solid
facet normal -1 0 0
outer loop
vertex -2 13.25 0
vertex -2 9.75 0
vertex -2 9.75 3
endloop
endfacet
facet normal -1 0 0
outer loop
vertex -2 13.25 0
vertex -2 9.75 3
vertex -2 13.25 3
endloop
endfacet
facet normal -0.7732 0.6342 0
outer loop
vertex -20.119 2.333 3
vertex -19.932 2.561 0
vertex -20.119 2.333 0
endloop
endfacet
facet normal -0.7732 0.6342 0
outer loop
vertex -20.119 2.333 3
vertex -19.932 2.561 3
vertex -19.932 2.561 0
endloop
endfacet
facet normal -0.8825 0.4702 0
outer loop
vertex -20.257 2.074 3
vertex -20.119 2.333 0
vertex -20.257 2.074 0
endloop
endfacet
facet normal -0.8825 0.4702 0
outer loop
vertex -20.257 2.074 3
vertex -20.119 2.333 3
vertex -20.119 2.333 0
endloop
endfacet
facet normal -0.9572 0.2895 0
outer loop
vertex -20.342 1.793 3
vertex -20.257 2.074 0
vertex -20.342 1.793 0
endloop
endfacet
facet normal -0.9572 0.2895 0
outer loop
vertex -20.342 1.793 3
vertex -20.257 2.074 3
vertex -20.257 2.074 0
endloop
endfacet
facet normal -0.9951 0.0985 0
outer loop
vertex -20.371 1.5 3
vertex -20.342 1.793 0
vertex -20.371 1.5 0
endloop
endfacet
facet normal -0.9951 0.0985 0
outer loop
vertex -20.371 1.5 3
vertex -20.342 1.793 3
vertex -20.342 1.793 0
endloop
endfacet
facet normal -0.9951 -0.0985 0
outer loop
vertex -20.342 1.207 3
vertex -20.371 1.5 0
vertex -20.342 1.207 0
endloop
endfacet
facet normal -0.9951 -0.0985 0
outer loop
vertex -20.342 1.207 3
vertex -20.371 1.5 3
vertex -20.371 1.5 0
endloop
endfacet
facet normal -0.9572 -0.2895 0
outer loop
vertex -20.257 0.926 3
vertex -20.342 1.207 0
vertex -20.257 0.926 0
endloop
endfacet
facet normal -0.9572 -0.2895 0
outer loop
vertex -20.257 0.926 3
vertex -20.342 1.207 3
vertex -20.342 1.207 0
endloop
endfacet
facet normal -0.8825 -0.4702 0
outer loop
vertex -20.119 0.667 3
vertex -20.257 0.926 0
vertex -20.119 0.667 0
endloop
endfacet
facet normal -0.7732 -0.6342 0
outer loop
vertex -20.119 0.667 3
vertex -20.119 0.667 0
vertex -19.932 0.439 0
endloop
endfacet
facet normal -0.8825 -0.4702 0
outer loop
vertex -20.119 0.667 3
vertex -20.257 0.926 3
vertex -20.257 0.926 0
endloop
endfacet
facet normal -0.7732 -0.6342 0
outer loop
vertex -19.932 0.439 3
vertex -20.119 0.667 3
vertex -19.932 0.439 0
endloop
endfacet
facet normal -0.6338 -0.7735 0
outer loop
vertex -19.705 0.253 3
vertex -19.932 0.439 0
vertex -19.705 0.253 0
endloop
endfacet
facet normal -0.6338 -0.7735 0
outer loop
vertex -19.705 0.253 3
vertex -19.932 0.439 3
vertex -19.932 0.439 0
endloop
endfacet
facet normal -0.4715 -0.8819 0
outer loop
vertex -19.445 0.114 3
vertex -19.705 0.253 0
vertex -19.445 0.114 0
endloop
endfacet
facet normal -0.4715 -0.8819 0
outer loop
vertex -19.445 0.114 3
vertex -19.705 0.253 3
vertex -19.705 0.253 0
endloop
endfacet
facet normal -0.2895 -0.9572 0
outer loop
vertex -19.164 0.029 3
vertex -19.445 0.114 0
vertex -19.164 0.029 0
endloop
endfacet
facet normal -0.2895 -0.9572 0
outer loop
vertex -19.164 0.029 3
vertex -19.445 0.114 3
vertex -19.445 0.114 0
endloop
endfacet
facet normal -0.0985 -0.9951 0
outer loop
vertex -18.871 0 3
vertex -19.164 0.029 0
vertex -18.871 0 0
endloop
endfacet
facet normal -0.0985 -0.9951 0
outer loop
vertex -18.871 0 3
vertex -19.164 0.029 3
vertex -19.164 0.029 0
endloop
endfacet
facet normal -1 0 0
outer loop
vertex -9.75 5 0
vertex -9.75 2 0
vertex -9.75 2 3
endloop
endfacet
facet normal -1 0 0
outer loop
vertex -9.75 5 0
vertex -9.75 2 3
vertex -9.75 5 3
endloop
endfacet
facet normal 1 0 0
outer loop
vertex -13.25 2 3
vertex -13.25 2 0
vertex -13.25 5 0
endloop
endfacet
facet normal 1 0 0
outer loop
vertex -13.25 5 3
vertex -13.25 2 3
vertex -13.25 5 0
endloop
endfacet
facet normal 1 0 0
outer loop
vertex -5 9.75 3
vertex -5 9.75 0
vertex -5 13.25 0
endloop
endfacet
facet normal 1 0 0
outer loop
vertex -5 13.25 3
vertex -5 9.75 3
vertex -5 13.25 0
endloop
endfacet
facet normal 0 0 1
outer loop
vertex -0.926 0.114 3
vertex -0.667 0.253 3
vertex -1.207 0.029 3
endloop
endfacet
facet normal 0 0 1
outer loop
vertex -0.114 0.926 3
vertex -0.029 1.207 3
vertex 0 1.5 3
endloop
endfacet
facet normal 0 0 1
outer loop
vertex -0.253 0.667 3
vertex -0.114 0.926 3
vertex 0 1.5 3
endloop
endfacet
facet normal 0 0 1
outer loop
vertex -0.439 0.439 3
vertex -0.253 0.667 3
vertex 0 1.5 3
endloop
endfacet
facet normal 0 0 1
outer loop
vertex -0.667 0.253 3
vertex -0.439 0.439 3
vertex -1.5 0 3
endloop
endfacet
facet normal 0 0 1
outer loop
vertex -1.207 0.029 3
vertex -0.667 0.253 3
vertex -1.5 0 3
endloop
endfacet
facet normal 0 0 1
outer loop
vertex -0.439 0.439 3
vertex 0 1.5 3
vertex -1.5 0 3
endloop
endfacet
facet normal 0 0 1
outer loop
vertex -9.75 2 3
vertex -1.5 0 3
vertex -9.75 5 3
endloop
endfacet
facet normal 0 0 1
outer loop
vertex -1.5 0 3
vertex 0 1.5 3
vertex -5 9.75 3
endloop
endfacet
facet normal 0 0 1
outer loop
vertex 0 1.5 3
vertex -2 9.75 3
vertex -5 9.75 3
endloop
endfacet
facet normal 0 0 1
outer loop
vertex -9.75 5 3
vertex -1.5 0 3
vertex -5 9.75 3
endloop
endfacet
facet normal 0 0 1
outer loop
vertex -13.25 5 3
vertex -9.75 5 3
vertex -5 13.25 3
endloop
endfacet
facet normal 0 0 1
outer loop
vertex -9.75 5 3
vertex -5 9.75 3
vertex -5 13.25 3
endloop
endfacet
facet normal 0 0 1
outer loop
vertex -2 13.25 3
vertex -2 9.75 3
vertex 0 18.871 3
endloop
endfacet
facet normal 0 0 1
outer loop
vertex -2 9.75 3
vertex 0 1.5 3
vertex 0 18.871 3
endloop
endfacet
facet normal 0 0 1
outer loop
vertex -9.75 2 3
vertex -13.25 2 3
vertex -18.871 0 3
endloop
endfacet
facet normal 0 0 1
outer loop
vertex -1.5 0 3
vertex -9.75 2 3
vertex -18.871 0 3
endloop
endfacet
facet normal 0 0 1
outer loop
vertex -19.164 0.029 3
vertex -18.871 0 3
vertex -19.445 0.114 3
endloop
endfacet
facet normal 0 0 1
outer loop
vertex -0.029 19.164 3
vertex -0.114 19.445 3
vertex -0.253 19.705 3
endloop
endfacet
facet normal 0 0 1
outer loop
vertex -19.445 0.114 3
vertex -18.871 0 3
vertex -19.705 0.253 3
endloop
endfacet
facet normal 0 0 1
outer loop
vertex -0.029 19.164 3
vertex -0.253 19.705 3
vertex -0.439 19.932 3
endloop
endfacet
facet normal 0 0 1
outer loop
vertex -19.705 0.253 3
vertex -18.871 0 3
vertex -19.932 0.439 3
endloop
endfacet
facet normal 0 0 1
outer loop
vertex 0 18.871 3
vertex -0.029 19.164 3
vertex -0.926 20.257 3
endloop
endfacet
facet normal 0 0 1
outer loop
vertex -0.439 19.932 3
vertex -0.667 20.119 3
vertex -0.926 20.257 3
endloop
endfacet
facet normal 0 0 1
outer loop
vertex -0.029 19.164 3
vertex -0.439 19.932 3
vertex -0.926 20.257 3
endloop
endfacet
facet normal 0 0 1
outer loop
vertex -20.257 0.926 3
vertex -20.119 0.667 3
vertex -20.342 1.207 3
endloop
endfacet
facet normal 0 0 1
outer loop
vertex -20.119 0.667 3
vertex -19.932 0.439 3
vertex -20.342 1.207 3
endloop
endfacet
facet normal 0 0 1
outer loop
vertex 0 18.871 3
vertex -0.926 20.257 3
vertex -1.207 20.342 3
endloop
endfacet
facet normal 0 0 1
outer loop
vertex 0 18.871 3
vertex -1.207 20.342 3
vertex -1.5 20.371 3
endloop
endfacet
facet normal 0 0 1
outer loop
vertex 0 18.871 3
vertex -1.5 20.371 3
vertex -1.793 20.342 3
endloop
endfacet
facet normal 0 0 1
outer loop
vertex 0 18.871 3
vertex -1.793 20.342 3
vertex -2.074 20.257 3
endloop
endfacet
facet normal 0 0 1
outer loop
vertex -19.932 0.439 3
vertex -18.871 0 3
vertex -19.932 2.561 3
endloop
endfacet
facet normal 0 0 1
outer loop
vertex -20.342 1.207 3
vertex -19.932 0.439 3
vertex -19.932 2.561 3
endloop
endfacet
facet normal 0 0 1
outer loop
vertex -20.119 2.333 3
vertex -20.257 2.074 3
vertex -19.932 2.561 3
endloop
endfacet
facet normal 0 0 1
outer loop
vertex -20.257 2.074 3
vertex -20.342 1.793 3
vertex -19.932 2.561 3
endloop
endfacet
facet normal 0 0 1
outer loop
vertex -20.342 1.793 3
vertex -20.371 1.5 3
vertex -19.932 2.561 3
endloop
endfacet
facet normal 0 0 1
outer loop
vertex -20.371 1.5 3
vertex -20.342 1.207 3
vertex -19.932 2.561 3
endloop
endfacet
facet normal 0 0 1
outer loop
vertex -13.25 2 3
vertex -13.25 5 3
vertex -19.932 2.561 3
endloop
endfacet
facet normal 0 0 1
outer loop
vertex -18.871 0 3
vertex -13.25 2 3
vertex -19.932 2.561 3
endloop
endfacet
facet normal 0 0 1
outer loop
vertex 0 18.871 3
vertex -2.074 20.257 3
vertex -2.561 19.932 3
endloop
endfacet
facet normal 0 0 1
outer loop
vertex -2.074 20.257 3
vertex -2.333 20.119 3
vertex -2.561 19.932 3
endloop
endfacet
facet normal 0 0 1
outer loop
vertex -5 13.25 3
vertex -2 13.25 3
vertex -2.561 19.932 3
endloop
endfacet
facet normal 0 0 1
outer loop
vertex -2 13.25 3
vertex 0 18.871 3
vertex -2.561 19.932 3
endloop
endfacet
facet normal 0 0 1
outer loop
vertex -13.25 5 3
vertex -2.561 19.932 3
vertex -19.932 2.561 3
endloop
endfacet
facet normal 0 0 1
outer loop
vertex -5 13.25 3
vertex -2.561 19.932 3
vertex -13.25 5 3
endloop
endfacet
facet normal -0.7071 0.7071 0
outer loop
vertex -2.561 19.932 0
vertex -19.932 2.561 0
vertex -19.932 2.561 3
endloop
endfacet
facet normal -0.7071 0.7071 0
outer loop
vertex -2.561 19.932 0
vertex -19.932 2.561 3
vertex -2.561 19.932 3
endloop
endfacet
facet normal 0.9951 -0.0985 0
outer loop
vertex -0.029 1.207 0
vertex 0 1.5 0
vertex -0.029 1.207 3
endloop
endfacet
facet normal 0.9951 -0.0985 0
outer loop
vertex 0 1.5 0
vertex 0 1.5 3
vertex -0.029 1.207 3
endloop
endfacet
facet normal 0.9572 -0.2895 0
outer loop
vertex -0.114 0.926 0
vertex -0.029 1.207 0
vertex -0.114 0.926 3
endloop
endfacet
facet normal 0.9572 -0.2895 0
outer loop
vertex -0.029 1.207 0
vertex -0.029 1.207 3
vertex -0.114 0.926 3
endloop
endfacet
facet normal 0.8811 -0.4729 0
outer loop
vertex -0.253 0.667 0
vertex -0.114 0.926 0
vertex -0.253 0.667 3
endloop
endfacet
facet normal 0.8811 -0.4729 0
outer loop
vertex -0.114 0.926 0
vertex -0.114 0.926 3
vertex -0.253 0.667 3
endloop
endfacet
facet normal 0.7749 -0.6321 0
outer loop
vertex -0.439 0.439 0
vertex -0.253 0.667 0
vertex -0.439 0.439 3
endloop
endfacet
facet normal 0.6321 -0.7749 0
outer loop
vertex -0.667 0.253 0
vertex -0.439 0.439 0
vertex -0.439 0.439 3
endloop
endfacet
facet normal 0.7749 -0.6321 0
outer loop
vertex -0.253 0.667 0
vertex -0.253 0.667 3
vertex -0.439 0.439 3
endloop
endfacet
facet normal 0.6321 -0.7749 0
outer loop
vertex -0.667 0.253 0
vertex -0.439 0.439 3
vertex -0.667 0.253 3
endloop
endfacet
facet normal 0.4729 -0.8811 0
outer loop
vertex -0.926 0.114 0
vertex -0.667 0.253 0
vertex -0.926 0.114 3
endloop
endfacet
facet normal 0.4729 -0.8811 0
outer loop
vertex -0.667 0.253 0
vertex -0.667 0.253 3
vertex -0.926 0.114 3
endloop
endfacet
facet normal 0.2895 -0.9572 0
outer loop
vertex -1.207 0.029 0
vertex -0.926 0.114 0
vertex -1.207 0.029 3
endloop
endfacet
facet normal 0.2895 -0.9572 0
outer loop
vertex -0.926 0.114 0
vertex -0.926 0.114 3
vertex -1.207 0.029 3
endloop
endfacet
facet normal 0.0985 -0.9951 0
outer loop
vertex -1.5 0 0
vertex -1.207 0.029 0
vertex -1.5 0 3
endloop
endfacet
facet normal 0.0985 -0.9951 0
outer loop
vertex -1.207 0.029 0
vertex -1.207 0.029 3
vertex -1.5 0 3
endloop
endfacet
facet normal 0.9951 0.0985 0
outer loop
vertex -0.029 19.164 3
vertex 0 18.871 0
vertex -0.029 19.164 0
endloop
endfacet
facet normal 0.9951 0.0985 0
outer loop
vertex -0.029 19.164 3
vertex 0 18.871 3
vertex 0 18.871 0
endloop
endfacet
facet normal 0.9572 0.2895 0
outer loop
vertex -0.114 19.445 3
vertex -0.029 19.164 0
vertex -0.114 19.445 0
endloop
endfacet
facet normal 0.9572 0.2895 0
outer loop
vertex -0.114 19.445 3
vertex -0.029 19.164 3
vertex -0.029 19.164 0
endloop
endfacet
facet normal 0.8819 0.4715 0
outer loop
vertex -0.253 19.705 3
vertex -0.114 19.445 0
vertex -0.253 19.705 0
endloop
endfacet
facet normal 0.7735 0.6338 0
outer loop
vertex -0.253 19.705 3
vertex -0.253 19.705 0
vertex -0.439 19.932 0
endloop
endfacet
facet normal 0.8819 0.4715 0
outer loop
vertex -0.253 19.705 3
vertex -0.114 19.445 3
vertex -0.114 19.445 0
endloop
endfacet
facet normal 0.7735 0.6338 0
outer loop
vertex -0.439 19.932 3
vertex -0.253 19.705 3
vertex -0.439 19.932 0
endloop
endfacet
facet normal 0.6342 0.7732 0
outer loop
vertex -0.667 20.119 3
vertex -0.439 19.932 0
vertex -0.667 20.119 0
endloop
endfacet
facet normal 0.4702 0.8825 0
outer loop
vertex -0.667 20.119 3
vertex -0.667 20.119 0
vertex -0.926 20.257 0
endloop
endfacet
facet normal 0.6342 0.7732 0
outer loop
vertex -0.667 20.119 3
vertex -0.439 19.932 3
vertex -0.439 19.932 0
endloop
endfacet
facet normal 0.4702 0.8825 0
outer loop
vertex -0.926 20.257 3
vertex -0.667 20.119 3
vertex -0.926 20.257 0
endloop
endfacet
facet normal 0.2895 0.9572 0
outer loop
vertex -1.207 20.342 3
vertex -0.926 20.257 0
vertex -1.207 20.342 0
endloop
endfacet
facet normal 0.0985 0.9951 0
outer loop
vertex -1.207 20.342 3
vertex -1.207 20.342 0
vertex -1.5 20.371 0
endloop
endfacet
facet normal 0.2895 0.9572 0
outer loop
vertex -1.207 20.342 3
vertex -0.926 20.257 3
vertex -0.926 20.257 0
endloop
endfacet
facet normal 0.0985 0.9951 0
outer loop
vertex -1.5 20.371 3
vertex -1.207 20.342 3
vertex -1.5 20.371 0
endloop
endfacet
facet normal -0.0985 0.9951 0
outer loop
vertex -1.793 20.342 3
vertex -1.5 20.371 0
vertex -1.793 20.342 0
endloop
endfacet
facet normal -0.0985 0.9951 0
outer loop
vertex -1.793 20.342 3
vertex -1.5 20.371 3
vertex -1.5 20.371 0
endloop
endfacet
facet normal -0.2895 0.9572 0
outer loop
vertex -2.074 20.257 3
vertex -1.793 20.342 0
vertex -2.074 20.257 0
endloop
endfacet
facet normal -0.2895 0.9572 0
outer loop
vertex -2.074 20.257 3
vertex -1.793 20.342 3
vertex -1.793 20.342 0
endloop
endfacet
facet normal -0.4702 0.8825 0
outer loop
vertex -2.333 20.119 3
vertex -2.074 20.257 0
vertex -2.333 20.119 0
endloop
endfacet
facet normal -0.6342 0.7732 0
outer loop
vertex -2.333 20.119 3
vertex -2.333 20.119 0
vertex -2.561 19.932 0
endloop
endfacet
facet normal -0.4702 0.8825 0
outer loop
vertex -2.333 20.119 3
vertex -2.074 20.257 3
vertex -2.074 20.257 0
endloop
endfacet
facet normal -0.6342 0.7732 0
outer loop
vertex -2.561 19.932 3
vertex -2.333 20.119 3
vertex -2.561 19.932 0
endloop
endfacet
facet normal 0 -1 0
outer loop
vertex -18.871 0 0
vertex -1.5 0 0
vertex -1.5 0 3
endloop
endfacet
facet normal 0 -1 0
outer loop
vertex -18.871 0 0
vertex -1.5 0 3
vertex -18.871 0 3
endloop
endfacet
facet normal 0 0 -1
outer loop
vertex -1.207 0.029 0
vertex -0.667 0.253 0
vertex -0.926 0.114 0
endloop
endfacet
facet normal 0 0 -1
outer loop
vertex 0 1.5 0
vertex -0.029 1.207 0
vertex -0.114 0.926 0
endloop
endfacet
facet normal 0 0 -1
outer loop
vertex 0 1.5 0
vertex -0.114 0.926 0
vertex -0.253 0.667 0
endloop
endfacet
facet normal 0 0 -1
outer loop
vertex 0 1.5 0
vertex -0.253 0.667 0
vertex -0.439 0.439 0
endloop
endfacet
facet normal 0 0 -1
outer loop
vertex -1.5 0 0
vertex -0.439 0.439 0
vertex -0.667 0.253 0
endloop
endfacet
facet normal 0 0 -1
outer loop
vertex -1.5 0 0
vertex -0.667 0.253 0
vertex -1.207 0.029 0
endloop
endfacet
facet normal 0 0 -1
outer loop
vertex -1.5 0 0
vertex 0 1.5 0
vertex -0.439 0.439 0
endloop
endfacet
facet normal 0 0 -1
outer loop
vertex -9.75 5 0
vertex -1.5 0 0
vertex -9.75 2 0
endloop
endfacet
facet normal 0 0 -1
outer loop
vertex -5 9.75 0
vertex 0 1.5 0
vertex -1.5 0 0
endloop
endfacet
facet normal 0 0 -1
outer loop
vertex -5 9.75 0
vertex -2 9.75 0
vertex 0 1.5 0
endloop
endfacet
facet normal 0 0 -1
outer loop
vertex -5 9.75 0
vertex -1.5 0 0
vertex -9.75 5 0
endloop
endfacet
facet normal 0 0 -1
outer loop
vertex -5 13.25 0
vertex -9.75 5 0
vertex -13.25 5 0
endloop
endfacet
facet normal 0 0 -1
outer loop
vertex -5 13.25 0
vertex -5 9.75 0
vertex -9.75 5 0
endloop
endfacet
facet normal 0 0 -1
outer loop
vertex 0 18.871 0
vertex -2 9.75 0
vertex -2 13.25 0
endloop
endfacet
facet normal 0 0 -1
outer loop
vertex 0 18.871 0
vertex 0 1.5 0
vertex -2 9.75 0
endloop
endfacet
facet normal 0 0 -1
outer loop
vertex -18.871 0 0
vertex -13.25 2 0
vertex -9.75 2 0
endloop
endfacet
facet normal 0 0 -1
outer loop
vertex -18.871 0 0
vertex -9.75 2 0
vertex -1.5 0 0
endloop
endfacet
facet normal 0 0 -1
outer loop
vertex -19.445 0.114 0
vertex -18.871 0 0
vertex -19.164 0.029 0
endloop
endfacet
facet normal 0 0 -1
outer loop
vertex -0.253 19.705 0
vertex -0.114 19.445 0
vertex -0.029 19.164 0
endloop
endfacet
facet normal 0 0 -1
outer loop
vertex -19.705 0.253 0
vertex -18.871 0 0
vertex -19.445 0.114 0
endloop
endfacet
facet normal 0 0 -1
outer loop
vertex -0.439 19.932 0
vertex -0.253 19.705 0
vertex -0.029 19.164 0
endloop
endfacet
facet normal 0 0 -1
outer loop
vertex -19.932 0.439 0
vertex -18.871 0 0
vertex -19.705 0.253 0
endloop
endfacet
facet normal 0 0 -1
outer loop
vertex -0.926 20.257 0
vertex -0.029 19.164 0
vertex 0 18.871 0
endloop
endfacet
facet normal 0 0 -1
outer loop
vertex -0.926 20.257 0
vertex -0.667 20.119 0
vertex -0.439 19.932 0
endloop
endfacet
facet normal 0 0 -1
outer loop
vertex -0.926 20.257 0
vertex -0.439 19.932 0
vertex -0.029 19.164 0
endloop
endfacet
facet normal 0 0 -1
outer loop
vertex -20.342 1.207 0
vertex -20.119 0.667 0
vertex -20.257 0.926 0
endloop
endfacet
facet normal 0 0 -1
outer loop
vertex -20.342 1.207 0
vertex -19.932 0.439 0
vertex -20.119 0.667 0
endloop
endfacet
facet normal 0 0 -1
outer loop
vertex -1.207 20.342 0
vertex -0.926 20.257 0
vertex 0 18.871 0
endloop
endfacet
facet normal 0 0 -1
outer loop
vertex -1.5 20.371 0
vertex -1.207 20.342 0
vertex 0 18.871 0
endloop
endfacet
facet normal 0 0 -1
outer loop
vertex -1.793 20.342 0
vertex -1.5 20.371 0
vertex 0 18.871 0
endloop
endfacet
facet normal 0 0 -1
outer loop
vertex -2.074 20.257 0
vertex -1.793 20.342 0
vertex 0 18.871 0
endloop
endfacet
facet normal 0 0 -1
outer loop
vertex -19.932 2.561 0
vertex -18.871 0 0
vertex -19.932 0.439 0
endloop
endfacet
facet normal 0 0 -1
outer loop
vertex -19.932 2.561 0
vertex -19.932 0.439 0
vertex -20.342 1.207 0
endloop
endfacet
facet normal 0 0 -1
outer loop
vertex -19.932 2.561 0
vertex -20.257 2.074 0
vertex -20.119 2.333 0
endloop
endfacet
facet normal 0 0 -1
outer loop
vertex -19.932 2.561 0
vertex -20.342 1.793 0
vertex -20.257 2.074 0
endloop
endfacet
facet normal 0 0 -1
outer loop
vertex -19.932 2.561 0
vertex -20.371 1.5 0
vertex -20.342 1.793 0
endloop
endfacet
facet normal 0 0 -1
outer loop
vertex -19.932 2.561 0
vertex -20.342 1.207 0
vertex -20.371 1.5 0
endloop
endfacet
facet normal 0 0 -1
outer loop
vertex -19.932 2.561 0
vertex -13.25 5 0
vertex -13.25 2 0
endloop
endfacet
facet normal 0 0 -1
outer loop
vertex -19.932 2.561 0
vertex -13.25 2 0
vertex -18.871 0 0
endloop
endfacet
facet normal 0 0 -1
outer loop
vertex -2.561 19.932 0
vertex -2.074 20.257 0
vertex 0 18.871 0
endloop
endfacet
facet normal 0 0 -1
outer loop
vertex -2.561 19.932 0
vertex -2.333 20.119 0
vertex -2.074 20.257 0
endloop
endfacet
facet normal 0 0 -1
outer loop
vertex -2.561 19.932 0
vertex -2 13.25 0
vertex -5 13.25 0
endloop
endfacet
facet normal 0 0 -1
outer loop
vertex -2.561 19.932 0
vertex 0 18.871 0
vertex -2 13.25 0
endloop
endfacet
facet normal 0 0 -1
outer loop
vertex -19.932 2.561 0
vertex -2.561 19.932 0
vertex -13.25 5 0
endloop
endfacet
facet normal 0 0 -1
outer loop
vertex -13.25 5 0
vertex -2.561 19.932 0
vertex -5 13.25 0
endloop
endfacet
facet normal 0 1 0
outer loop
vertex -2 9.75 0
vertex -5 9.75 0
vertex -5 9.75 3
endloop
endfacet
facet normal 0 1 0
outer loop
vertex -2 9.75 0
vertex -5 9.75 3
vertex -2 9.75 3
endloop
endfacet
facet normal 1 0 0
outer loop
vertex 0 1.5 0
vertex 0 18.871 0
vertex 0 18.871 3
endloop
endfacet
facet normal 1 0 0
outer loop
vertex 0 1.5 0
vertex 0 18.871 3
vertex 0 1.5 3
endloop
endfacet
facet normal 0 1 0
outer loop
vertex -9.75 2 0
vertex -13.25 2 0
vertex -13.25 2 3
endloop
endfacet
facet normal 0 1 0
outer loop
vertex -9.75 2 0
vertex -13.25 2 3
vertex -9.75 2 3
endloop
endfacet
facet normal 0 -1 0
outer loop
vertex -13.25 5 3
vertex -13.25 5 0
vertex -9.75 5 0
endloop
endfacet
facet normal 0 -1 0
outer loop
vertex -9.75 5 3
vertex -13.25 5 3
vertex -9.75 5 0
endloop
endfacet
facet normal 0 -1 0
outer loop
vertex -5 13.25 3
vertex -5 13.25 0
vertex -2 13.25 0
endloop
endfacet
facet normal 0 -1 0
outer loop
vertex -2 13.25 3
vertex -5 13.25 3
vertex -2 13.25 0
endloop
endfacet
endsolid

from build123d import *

# Parameters (mm, degrees)
SKETCH_1_W      = 3.5
SKETCH_1_H      = 3
SKETCH_1_W_2    = 3
SKETCH_1_H_2    = 3.5
EXTRUDE_1_DEPTH = 3
FILLET_1_R      = 1.5


with BuildPart() as part:
    # Эскиз1 → Бобышка-Вытянуть1 (new body)
    with BuildSketch(Plane.XY):
        Polygon((0, 22.492640687), (0, 0), (-22.492640687, 0), align=None)
        with Locations((-11.5, 3.5)):
            Rectangle(SKETCH_1_W, SKETCH_1_H, mode=Mode.SUBTRACT)
        with Locations((-3.5, 11.5)):
            Rectangle(SKETCH_1_W_2, SKETCH_1_H_2, mode=Mode.SUBTRACT)
    extrude(amount=EXTRUDE_1_DEPTH)

    # Скругление1
    fillet_1_edges = [part.edges().sort_by_distance(p)[0] for p in [
        (0, 0, 1.5),
        (-22.492640687, 0, 1.5),
        (0, 22.492640687, 1.5),
    ]]
    fillet(fillet_1_edges, radius=FILLET_1_R)


solid = part.part
